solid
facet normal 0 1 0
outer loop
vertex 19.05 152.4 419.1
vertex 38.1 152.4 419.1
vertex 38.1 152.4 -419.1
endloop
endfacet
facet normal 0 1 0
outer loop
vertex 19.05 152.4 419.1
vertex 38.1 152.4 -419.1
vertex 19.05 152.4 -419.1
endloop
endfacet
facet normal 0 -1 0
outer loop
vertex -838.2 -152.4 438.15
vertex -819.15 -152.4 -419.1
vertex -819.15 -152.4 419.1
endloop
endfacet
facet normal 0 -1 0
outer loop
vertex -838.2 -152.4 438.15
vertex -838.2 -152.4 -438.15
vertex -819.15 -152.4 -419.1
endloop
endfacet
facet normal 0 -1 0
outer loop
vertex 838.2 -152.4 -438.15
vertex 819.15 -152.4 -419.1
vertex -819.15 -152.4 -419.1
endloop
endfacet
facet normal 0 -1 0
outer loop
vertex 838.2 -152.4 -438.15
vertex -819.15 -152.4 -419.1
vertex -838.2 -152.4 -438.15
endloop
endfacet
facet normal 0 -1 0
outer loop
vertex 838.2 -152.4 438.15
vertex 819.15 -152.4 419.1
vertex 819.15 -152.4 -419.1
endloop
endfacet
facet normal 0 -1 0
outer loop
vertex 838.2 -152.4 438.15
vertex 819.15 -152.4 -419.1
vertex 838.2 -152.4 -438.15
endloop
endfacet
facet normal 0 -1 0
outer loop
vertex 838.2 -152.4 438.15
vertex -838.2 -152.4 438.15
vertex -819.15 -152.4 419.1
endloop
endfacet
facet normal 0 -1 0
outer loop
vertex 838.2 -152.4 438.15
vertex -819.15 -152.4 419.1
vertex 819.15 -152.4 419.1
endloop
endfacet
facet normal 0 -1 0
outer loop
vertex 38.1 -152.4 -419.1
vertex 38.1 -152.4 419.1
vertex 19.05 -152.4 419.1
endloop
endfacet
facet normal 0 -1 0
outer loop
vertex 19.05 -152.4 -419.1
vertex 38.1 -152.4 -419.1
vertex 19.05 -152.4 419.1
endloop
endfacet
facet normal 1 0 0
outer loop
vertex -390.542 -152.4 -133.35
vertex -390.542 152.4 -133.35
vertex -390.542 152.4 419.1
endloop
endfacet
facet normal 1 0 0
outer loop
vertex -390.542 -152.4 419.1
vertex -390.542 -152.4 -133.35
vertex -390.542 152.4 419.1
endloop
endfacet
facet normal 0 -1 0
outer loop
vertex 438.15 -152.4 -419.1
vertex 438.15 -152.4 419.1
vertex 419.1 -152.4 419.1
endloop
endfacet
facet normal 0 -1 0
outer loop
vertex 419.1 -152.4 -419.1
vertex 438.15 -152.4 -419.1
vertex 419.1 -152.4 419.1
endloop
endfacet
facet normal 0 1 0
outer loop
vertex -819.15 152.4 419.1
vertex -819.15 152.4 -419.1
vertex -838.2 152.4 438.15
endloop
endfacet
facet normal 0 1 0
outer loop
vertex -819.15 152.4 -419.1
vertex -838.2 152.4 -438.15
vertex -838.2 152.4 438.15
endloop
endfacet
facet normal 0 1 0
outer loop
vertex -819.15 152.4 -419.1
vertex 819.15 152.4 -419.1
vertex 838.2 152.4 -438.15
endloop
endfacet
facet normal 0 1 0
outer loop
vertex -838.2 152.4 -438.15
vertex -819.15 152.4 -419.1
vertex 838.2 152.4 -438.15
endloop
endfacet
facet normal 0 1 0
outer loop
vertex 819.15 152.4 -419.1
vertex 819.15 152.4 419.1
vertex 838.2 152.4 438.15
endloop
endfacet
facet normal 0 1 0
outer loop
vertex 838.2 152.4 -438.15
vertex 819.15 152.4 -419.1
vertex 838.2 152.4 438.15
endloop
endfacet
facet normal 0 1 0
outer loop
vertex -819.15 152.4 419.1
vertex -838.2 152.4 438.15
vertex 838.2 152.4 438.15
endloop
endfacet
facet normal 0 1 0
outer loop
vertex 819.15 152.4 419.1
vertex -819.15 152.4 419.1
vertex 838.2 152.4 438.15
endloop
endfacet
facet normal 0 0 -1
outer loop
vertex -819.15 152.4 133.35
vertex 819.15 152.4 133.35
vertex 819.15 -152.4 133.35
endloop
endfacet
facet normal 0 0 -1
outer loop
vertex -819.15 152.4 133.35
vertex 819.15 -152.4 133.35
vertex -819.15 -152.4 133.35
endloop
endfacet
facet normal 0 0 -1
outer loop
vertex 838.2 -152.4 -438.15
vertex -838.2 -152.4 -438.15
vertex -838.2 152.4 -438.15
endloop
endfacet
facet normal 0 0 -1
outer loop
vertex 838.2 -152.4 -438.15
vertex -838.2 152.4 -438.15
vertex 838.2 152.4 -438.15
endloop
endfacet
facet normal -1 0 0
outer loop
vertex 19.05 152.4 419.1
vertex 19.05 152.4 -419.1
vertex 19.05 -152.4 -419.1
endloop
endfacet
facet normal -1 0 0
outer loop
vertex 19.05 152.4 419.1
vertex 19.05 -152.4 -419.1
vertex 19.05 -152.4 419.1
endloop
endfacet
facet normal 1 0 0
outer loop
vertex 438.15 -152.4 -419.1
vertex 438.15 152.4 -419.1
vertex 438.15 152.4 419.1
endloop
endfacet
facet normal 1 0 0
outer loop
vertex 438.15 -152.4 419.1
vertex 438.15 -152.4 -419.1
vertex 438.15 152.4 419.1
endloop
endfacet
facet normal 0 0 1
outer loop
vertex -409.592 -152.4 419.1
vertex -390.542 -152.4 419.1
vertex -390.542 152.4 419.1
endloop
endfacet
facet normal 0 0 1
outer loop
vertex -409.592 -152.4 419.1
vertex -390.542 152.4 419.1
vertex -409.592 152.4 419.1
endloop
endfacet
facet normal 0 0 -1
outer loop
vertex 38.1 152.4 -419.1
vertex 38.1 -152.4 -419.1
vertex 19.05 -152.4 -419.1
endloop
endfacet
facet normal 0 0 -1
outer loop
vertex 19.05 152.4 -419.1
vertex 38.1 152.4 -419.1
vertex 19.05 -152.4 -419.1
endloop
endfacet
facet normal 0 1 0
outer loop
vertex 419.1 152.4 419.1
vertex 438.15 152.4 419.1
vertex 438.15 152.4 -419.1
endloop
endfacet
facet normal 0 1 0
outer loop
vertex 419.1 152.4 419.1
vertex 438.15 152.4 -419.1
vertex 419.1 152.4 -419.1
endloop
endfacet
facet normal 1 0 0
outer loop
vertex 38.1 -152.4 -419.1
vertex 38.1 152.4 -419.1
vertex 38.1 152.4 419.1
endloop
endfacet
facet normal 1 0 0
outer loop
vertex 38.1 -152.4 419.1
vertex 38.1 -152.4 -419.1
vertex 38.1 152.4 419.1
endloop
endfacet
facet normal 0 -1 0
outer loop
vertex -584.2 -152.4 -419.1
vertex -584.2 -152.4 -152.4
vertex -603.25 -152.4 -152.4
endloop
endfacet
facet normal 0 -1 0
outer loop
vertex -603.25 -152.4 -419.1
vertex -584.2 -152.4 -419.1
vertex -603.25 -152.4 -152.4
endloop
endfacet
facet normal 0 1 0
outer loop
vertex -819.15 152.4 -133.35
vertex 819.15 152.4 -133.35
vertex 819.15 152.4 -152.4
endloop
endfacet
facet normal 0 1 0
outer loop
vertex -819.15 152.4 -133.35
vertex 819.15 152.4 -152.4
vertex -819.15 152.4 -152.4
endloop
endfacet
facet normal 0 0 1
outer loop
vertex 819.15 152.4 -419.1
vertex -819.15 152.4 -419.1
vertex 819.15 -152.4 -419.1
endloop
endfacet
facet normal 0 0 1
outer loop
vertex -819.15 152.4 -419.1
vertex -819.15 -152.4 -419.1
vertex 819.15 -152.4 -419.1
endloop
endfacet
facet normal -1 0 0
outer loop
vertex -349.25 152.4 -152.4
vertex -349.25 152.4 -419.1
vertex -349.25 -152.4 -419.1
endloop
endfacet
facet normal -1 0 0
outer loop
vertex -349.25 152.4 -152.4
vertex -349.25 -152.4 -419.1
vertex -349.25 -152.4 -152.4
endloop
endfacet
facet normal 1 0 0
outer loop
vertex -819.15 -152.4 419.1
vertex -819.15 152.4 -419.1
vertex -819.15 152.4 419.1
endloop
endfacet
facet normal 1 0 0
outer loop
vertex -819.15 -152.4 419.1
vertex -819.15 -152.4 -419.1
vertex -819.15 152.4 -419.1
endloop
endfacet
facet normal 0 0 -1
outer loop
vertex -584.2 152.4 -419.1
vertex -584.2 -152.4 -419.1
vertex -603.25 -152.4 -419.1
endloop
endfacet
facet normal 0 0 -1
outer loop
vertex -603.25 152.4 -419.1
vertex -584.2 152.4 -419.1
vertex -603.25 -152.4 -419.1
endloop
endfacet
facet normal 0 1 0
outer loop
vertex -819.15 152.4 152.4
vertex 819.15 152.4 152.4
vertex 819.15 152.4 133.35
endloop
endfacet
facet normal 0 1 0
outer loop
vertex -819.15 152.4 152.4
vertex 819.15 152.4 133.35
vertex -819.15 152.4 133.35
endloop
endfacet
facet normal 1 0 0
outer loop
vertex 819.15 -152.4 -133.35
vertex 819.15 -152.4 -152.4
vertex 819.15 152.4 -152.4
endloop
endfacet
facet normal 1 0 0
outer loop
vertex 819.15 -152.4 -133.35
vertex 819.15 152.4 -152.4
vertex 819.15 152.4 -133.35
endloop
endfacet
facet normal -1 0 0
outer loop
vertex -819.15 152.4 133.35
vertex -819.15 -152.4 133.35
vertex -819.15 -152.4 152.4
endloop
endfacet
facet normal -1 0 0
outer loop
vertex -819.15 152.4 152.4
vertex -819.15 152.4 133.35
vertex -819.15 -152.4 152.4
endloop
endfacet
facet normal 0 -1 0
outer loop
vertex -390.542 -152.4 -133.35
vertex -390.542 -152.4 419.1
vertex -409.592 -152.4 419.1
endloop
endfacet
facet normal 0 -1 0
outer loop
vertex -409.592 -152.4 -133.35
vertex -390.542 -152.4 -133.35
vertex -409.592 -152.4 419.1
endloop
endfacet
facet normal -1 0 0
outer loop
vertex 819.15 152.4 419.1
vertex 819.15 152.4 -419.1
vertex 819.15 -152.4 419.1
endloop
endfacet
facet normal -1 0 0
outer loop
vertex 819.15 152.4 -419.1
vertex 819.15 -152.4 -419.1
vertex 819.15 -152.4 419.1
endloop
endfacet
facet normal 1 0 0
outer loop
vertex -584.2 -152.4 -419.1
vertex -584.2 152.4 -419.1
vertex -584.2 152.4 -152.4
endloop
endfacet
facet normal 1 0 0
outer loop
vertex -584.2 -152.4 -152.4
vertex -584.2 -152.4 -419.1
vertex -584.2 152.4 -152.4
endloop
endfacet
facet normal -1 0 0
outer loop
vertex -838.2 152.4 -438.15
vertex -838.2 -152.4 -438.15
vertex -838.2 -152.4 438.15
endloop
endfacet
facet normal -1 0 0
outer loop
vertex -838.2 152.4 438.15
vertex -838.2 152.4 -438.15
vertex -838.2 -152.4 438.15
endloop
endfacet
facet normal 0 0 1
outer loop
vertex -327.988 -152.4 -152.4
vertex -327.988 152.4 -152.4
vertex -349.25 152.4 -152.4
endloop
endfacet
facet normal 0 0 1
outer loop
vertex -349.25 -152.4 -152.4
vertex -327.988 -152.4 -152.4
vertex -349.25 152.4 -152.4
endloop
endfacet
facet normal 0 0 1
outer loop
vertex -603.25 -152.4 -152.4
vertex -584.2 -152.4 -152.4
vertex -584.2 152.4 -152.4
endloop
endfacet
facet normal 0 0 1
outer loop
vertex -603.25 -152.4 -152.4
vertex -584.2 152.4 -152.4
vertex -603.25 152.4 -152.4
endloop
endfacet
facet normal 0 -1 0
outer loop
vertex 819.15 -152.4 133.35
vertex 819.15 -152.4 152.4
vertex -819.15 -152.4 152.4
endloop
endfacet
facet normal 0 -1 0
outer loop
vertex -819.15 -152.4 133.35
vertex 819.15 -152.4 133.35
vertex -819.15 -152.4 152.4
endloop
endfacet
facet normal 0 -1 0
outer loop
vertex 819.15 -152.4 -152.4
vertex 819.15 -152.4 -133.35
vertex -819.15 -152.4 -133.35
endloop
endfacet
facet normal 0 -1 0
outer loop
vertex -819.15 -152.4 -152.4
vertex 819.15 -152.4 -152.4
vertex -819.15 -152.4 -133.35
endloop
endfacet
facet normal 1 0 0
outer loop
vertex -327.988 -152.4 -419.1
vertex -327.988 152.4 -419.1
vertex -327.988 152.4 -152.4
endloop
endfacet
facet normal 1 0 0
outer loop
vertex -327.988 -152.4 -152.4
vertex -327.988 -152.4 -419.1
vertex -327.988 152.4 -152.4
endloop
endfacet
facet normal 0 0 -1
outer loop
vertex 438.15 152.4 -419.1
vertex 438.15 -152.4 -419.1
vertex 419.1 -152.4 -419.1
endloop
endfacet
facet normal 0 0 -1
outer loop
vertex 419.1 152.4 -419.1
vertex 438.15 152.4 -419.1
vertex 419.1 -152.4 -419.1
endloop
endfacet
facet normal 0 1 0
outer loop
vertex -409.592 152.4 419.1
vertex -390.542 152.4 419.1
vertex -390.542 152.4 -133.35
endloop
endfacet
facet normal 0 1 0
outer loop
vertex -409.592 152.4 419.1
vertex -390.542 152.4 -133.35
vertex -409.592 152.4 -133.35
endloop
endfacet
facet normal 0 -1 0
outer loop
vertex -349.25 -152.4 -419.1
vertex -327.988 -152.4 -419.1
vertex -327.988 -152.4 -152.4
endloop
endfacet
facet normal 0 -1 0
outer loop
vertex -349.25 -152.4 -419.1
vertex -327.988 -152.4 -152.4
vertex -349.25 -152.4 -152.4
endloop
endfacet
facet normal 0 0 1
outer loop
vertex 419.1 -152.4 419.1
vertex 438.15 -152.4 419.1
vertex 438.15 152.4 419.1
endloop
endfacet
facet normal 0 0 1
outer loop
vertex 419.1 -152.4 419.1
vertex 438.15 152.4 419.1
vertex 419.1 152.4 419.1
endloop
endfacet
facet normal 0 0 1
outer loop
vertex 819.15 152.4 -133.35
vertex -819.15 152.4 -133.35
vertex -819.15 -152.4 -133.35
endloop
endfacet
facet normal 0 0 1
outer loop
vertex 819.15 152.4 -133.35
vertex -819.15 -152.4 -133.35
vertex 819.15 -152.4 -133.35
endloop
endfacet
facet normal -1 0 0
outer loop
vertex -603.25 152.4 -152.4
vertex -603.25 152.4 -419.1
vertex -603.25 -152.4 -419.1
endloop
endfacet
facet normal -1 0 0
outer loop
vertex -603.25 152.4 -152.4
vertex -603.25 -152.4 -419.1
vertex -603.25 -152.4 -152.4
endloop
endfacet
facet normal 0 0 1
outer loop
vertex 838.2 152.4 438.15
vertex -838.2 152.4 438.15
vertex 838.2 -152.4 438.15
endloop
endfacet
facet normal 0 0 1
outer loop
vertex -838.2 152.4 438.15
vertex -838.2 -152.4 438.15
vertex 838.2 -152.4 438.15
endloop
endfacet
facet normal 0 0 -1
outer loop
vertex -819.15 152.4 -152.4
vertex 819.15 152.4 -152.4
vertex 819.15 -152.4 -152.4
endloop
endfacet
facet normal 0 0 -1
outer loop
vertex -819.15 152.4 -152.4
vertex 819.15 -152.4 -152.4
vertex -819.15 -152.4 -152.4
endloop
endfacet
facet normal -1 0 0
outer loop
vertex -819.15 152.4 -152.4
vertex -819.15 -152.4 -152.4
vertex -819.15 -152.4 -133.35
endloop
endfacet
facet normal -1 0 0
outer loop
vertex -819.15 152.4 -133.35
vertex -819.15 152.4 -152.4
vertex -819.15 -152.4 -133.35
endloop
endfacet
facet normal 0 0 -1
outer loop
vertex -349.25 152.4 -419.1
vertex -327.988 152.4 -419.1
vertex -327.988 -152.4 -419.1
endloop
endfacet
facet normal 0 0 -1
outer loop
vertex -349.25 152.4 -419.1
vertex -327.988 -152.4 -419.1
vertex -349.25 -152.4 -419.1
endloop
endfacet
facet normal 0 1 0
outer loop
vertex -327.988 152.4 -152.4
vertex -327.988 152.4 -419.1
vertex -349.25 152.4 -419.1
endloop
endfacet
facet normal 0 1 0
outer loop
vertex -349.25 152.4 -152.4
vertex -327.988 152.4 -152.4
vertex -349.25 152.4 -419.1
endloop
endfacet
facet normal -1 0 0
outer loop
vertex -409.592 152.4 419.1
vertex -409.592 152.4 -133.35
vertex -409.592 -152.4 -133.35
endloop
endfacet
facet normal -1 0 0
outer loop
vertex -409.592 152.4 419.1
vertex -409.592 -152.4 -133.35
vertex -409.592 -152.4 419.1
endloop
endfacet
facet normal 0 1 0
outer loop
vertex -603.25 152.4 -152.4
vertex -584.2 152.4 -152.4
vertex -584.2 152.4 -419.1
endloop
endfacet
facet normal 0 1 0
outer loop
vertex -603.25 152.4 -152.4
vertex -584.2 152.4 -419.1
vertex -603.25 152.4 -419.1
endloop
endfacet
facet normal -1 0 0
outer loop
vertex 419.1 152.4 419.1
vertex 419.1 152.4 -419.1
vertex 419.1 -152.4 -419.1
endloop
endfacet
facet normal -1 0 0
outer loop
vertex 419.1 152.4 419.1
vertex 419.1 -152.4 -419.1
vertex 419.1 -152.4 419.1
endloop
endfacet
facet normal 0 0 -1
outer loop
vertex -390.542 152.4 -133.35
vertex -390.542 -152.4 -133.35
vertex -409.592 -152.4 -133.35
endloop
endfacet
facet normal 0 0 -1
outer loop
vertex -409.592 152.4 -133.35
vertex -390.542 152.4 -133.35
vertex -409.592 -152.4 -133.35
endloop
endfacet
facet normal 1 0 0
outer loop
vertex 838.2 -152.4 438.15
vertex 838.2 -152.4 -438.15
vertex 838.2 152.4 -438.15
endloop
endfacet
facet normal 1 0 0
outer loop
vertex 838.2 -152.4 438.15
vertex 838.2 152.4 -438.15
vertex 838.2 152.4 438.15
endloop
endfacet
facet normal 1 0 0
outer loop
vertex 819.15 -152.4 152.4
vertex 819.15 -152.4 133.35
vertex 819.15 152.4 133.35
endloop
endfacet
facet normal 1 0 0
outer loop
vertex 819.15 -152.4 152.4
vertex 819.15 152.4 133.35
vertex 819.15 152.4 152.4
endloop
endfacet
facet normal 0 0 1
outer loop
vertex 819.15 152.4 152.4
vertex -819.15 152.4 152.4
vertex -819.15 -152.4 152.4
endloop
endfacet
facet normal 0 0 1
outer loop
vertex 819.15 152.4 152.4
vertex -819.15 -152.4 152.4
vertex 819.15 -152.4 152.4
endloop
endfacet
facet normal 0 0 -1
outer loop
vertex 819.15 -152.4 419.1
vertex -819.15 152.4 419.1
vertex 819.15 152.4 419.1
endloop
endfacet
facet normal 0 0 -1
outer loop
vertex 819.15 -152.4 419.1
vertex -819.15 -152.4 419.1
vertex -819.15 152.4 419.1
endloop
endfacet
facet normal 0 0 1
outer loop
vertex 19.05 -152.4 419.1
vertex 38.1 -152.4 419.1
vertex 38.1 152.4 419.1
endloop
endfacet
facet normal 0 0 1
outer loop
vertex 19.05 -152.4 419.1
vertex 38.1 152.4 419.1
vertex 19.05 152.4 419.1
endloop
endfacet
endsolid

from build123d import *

# Parameters (mm, degrees)
F1_W      = 1676.4
F1_H      = 876.3
F2_DEPTH  = 152.4
F3_T      = -19.05
F4_W      = 19.05
F4_H      = 838.2
F5_DEPTH  = 304.8
F6_W      = 19.05
F6_H      = 838.2
F7_DEPTH  = 304.8
F8_W      = 781.05
F8_H      = 19.05
F8_W_2    = 838.2
F8_W_3    = 19.05
F9_DEPTH  = 304.8
F10_W     = 19.05
F10_H     = 552.45
F11_DEPTH = 304.8
F10_W_2   = 21.2622992992
F10_H_2   = 266.7


with BuildPart() as f2:
    # F1 (on Front) → F2 (new body, symmetric)
    with BuildSketch(Plane.XZ):
        Rectangle(F1_W, F1_H)
    extrude(amount=F2_DEPTH, both=True)

    # F3
    f3_openings = [f2.faces().sort_by_distance(p)[0] for p in [
        (0, -152.4, 0),
        (0, 152.4, 0),
    ]]
    offset(amount=F3_T, openings=f3_openings)


with BuildPart() as f5:
    # F4 (on face) → F5 (new body)
    with BuildSketch(Plane(origin=(0, 152.4, 0), x_dir=(-1, 0, 0), z_dir=(0, 1, 0))):
        with Locations((-428.625, 0)):
            Rectangle(F4_W, F4_H)
    extrude(amount=-F5_DEPTH)


with BuildPart() as f7:
    # F6 (on face) → F7 (new body)
    with BuildSketch(Plane(origin=(0, 152.4, 0), x_dir=(-1, 0, 0), z_dir=(0, 1, 0))):
        with Locations((-28.575, 0)):
            Rectangle(F6_W, F6_H)
    extrude(amount=-F7_DEPTH)


with BuildPart() as f9:
    # F8 (on face) → F9 (new body)
    with BuildSketch(Plane(origin=(0, 152.4, 0), x_dir=(-1, 0, 0), z_dir=(0, 1, 0))):
        with Locations((-428.625, 142.875)):
            Rectangle(F8_W, F8_H)
        with Locations((400.05, 142.875)):
            Rectangle(F8_W_2, F8_H)
        with Locations((-28.575, 142.875)):
            Rectangle(F8_W_3, F8_H)
    extrude(amount=-F9_DEPTH)


with BuildPart() as f9b:
    # F8 (on face) → F9, piece 2 (new body)
    with BuildSketch(Plane(origin=(0, 152.4, 0), x_dir=(-1, 0, 0), z_dir=(0, 1, 0))):
        with Locations((-428.625, -142.875)):
            Rectangle(F8_W, F8_H)
        with Locations((-28.575, -142.875)):
            Rectangle(F8_W_3, F8_H)
        with Locations((400.05, -142.875)):
            Rectangle(F8_W_2, F8_H)
    extrude(amount=-F9_DEPTH)


with BuildPart() as f11:
    # F10 (on face) → F11 (new body)
    with BuildSketch(Plane(origin=(0, 152.4, 0), x_dir=(-1, 0, 0), z_dir=(0, 1, 0))):
        with Locations((400.0669707298, 142.875)):
            Rectangle(F10_W, F10_H)
    extrude(amount=-F11_DEPTH)


with BuildPart() as f11b:
    # F10 (on face) → F11, piece 2 (new body)
    with BuildSketch(Plane(origin=(0, 152.4, 0), x_dir=(-1, 0, 0), z_dir=(0, 1, 0))):
        with Locations((338.6188503504, -285.75)):
            Rectangle(F10_W_2, F10_H_2)
    extrude(amount=-F11_DEPTH)


with BuildPart() as f11c:
    # F10 (on face) → F11, piece 3 (new body)
    with BuildSketch(Plane(origin=(0, 152.4, 0), x_dir=(-1, 0, 0), z_dir=(0, 1, 0))):
        with Locations((593.725, -285.75)):
            Rectangle(F10_W, F10_H_2)
    extrude(amount=-F11_DEPTH)


solid = Compound([f2.part, f5.part, f7.part, f9.part, f9b.part, f11.part, f11b.part, f11c.part])
